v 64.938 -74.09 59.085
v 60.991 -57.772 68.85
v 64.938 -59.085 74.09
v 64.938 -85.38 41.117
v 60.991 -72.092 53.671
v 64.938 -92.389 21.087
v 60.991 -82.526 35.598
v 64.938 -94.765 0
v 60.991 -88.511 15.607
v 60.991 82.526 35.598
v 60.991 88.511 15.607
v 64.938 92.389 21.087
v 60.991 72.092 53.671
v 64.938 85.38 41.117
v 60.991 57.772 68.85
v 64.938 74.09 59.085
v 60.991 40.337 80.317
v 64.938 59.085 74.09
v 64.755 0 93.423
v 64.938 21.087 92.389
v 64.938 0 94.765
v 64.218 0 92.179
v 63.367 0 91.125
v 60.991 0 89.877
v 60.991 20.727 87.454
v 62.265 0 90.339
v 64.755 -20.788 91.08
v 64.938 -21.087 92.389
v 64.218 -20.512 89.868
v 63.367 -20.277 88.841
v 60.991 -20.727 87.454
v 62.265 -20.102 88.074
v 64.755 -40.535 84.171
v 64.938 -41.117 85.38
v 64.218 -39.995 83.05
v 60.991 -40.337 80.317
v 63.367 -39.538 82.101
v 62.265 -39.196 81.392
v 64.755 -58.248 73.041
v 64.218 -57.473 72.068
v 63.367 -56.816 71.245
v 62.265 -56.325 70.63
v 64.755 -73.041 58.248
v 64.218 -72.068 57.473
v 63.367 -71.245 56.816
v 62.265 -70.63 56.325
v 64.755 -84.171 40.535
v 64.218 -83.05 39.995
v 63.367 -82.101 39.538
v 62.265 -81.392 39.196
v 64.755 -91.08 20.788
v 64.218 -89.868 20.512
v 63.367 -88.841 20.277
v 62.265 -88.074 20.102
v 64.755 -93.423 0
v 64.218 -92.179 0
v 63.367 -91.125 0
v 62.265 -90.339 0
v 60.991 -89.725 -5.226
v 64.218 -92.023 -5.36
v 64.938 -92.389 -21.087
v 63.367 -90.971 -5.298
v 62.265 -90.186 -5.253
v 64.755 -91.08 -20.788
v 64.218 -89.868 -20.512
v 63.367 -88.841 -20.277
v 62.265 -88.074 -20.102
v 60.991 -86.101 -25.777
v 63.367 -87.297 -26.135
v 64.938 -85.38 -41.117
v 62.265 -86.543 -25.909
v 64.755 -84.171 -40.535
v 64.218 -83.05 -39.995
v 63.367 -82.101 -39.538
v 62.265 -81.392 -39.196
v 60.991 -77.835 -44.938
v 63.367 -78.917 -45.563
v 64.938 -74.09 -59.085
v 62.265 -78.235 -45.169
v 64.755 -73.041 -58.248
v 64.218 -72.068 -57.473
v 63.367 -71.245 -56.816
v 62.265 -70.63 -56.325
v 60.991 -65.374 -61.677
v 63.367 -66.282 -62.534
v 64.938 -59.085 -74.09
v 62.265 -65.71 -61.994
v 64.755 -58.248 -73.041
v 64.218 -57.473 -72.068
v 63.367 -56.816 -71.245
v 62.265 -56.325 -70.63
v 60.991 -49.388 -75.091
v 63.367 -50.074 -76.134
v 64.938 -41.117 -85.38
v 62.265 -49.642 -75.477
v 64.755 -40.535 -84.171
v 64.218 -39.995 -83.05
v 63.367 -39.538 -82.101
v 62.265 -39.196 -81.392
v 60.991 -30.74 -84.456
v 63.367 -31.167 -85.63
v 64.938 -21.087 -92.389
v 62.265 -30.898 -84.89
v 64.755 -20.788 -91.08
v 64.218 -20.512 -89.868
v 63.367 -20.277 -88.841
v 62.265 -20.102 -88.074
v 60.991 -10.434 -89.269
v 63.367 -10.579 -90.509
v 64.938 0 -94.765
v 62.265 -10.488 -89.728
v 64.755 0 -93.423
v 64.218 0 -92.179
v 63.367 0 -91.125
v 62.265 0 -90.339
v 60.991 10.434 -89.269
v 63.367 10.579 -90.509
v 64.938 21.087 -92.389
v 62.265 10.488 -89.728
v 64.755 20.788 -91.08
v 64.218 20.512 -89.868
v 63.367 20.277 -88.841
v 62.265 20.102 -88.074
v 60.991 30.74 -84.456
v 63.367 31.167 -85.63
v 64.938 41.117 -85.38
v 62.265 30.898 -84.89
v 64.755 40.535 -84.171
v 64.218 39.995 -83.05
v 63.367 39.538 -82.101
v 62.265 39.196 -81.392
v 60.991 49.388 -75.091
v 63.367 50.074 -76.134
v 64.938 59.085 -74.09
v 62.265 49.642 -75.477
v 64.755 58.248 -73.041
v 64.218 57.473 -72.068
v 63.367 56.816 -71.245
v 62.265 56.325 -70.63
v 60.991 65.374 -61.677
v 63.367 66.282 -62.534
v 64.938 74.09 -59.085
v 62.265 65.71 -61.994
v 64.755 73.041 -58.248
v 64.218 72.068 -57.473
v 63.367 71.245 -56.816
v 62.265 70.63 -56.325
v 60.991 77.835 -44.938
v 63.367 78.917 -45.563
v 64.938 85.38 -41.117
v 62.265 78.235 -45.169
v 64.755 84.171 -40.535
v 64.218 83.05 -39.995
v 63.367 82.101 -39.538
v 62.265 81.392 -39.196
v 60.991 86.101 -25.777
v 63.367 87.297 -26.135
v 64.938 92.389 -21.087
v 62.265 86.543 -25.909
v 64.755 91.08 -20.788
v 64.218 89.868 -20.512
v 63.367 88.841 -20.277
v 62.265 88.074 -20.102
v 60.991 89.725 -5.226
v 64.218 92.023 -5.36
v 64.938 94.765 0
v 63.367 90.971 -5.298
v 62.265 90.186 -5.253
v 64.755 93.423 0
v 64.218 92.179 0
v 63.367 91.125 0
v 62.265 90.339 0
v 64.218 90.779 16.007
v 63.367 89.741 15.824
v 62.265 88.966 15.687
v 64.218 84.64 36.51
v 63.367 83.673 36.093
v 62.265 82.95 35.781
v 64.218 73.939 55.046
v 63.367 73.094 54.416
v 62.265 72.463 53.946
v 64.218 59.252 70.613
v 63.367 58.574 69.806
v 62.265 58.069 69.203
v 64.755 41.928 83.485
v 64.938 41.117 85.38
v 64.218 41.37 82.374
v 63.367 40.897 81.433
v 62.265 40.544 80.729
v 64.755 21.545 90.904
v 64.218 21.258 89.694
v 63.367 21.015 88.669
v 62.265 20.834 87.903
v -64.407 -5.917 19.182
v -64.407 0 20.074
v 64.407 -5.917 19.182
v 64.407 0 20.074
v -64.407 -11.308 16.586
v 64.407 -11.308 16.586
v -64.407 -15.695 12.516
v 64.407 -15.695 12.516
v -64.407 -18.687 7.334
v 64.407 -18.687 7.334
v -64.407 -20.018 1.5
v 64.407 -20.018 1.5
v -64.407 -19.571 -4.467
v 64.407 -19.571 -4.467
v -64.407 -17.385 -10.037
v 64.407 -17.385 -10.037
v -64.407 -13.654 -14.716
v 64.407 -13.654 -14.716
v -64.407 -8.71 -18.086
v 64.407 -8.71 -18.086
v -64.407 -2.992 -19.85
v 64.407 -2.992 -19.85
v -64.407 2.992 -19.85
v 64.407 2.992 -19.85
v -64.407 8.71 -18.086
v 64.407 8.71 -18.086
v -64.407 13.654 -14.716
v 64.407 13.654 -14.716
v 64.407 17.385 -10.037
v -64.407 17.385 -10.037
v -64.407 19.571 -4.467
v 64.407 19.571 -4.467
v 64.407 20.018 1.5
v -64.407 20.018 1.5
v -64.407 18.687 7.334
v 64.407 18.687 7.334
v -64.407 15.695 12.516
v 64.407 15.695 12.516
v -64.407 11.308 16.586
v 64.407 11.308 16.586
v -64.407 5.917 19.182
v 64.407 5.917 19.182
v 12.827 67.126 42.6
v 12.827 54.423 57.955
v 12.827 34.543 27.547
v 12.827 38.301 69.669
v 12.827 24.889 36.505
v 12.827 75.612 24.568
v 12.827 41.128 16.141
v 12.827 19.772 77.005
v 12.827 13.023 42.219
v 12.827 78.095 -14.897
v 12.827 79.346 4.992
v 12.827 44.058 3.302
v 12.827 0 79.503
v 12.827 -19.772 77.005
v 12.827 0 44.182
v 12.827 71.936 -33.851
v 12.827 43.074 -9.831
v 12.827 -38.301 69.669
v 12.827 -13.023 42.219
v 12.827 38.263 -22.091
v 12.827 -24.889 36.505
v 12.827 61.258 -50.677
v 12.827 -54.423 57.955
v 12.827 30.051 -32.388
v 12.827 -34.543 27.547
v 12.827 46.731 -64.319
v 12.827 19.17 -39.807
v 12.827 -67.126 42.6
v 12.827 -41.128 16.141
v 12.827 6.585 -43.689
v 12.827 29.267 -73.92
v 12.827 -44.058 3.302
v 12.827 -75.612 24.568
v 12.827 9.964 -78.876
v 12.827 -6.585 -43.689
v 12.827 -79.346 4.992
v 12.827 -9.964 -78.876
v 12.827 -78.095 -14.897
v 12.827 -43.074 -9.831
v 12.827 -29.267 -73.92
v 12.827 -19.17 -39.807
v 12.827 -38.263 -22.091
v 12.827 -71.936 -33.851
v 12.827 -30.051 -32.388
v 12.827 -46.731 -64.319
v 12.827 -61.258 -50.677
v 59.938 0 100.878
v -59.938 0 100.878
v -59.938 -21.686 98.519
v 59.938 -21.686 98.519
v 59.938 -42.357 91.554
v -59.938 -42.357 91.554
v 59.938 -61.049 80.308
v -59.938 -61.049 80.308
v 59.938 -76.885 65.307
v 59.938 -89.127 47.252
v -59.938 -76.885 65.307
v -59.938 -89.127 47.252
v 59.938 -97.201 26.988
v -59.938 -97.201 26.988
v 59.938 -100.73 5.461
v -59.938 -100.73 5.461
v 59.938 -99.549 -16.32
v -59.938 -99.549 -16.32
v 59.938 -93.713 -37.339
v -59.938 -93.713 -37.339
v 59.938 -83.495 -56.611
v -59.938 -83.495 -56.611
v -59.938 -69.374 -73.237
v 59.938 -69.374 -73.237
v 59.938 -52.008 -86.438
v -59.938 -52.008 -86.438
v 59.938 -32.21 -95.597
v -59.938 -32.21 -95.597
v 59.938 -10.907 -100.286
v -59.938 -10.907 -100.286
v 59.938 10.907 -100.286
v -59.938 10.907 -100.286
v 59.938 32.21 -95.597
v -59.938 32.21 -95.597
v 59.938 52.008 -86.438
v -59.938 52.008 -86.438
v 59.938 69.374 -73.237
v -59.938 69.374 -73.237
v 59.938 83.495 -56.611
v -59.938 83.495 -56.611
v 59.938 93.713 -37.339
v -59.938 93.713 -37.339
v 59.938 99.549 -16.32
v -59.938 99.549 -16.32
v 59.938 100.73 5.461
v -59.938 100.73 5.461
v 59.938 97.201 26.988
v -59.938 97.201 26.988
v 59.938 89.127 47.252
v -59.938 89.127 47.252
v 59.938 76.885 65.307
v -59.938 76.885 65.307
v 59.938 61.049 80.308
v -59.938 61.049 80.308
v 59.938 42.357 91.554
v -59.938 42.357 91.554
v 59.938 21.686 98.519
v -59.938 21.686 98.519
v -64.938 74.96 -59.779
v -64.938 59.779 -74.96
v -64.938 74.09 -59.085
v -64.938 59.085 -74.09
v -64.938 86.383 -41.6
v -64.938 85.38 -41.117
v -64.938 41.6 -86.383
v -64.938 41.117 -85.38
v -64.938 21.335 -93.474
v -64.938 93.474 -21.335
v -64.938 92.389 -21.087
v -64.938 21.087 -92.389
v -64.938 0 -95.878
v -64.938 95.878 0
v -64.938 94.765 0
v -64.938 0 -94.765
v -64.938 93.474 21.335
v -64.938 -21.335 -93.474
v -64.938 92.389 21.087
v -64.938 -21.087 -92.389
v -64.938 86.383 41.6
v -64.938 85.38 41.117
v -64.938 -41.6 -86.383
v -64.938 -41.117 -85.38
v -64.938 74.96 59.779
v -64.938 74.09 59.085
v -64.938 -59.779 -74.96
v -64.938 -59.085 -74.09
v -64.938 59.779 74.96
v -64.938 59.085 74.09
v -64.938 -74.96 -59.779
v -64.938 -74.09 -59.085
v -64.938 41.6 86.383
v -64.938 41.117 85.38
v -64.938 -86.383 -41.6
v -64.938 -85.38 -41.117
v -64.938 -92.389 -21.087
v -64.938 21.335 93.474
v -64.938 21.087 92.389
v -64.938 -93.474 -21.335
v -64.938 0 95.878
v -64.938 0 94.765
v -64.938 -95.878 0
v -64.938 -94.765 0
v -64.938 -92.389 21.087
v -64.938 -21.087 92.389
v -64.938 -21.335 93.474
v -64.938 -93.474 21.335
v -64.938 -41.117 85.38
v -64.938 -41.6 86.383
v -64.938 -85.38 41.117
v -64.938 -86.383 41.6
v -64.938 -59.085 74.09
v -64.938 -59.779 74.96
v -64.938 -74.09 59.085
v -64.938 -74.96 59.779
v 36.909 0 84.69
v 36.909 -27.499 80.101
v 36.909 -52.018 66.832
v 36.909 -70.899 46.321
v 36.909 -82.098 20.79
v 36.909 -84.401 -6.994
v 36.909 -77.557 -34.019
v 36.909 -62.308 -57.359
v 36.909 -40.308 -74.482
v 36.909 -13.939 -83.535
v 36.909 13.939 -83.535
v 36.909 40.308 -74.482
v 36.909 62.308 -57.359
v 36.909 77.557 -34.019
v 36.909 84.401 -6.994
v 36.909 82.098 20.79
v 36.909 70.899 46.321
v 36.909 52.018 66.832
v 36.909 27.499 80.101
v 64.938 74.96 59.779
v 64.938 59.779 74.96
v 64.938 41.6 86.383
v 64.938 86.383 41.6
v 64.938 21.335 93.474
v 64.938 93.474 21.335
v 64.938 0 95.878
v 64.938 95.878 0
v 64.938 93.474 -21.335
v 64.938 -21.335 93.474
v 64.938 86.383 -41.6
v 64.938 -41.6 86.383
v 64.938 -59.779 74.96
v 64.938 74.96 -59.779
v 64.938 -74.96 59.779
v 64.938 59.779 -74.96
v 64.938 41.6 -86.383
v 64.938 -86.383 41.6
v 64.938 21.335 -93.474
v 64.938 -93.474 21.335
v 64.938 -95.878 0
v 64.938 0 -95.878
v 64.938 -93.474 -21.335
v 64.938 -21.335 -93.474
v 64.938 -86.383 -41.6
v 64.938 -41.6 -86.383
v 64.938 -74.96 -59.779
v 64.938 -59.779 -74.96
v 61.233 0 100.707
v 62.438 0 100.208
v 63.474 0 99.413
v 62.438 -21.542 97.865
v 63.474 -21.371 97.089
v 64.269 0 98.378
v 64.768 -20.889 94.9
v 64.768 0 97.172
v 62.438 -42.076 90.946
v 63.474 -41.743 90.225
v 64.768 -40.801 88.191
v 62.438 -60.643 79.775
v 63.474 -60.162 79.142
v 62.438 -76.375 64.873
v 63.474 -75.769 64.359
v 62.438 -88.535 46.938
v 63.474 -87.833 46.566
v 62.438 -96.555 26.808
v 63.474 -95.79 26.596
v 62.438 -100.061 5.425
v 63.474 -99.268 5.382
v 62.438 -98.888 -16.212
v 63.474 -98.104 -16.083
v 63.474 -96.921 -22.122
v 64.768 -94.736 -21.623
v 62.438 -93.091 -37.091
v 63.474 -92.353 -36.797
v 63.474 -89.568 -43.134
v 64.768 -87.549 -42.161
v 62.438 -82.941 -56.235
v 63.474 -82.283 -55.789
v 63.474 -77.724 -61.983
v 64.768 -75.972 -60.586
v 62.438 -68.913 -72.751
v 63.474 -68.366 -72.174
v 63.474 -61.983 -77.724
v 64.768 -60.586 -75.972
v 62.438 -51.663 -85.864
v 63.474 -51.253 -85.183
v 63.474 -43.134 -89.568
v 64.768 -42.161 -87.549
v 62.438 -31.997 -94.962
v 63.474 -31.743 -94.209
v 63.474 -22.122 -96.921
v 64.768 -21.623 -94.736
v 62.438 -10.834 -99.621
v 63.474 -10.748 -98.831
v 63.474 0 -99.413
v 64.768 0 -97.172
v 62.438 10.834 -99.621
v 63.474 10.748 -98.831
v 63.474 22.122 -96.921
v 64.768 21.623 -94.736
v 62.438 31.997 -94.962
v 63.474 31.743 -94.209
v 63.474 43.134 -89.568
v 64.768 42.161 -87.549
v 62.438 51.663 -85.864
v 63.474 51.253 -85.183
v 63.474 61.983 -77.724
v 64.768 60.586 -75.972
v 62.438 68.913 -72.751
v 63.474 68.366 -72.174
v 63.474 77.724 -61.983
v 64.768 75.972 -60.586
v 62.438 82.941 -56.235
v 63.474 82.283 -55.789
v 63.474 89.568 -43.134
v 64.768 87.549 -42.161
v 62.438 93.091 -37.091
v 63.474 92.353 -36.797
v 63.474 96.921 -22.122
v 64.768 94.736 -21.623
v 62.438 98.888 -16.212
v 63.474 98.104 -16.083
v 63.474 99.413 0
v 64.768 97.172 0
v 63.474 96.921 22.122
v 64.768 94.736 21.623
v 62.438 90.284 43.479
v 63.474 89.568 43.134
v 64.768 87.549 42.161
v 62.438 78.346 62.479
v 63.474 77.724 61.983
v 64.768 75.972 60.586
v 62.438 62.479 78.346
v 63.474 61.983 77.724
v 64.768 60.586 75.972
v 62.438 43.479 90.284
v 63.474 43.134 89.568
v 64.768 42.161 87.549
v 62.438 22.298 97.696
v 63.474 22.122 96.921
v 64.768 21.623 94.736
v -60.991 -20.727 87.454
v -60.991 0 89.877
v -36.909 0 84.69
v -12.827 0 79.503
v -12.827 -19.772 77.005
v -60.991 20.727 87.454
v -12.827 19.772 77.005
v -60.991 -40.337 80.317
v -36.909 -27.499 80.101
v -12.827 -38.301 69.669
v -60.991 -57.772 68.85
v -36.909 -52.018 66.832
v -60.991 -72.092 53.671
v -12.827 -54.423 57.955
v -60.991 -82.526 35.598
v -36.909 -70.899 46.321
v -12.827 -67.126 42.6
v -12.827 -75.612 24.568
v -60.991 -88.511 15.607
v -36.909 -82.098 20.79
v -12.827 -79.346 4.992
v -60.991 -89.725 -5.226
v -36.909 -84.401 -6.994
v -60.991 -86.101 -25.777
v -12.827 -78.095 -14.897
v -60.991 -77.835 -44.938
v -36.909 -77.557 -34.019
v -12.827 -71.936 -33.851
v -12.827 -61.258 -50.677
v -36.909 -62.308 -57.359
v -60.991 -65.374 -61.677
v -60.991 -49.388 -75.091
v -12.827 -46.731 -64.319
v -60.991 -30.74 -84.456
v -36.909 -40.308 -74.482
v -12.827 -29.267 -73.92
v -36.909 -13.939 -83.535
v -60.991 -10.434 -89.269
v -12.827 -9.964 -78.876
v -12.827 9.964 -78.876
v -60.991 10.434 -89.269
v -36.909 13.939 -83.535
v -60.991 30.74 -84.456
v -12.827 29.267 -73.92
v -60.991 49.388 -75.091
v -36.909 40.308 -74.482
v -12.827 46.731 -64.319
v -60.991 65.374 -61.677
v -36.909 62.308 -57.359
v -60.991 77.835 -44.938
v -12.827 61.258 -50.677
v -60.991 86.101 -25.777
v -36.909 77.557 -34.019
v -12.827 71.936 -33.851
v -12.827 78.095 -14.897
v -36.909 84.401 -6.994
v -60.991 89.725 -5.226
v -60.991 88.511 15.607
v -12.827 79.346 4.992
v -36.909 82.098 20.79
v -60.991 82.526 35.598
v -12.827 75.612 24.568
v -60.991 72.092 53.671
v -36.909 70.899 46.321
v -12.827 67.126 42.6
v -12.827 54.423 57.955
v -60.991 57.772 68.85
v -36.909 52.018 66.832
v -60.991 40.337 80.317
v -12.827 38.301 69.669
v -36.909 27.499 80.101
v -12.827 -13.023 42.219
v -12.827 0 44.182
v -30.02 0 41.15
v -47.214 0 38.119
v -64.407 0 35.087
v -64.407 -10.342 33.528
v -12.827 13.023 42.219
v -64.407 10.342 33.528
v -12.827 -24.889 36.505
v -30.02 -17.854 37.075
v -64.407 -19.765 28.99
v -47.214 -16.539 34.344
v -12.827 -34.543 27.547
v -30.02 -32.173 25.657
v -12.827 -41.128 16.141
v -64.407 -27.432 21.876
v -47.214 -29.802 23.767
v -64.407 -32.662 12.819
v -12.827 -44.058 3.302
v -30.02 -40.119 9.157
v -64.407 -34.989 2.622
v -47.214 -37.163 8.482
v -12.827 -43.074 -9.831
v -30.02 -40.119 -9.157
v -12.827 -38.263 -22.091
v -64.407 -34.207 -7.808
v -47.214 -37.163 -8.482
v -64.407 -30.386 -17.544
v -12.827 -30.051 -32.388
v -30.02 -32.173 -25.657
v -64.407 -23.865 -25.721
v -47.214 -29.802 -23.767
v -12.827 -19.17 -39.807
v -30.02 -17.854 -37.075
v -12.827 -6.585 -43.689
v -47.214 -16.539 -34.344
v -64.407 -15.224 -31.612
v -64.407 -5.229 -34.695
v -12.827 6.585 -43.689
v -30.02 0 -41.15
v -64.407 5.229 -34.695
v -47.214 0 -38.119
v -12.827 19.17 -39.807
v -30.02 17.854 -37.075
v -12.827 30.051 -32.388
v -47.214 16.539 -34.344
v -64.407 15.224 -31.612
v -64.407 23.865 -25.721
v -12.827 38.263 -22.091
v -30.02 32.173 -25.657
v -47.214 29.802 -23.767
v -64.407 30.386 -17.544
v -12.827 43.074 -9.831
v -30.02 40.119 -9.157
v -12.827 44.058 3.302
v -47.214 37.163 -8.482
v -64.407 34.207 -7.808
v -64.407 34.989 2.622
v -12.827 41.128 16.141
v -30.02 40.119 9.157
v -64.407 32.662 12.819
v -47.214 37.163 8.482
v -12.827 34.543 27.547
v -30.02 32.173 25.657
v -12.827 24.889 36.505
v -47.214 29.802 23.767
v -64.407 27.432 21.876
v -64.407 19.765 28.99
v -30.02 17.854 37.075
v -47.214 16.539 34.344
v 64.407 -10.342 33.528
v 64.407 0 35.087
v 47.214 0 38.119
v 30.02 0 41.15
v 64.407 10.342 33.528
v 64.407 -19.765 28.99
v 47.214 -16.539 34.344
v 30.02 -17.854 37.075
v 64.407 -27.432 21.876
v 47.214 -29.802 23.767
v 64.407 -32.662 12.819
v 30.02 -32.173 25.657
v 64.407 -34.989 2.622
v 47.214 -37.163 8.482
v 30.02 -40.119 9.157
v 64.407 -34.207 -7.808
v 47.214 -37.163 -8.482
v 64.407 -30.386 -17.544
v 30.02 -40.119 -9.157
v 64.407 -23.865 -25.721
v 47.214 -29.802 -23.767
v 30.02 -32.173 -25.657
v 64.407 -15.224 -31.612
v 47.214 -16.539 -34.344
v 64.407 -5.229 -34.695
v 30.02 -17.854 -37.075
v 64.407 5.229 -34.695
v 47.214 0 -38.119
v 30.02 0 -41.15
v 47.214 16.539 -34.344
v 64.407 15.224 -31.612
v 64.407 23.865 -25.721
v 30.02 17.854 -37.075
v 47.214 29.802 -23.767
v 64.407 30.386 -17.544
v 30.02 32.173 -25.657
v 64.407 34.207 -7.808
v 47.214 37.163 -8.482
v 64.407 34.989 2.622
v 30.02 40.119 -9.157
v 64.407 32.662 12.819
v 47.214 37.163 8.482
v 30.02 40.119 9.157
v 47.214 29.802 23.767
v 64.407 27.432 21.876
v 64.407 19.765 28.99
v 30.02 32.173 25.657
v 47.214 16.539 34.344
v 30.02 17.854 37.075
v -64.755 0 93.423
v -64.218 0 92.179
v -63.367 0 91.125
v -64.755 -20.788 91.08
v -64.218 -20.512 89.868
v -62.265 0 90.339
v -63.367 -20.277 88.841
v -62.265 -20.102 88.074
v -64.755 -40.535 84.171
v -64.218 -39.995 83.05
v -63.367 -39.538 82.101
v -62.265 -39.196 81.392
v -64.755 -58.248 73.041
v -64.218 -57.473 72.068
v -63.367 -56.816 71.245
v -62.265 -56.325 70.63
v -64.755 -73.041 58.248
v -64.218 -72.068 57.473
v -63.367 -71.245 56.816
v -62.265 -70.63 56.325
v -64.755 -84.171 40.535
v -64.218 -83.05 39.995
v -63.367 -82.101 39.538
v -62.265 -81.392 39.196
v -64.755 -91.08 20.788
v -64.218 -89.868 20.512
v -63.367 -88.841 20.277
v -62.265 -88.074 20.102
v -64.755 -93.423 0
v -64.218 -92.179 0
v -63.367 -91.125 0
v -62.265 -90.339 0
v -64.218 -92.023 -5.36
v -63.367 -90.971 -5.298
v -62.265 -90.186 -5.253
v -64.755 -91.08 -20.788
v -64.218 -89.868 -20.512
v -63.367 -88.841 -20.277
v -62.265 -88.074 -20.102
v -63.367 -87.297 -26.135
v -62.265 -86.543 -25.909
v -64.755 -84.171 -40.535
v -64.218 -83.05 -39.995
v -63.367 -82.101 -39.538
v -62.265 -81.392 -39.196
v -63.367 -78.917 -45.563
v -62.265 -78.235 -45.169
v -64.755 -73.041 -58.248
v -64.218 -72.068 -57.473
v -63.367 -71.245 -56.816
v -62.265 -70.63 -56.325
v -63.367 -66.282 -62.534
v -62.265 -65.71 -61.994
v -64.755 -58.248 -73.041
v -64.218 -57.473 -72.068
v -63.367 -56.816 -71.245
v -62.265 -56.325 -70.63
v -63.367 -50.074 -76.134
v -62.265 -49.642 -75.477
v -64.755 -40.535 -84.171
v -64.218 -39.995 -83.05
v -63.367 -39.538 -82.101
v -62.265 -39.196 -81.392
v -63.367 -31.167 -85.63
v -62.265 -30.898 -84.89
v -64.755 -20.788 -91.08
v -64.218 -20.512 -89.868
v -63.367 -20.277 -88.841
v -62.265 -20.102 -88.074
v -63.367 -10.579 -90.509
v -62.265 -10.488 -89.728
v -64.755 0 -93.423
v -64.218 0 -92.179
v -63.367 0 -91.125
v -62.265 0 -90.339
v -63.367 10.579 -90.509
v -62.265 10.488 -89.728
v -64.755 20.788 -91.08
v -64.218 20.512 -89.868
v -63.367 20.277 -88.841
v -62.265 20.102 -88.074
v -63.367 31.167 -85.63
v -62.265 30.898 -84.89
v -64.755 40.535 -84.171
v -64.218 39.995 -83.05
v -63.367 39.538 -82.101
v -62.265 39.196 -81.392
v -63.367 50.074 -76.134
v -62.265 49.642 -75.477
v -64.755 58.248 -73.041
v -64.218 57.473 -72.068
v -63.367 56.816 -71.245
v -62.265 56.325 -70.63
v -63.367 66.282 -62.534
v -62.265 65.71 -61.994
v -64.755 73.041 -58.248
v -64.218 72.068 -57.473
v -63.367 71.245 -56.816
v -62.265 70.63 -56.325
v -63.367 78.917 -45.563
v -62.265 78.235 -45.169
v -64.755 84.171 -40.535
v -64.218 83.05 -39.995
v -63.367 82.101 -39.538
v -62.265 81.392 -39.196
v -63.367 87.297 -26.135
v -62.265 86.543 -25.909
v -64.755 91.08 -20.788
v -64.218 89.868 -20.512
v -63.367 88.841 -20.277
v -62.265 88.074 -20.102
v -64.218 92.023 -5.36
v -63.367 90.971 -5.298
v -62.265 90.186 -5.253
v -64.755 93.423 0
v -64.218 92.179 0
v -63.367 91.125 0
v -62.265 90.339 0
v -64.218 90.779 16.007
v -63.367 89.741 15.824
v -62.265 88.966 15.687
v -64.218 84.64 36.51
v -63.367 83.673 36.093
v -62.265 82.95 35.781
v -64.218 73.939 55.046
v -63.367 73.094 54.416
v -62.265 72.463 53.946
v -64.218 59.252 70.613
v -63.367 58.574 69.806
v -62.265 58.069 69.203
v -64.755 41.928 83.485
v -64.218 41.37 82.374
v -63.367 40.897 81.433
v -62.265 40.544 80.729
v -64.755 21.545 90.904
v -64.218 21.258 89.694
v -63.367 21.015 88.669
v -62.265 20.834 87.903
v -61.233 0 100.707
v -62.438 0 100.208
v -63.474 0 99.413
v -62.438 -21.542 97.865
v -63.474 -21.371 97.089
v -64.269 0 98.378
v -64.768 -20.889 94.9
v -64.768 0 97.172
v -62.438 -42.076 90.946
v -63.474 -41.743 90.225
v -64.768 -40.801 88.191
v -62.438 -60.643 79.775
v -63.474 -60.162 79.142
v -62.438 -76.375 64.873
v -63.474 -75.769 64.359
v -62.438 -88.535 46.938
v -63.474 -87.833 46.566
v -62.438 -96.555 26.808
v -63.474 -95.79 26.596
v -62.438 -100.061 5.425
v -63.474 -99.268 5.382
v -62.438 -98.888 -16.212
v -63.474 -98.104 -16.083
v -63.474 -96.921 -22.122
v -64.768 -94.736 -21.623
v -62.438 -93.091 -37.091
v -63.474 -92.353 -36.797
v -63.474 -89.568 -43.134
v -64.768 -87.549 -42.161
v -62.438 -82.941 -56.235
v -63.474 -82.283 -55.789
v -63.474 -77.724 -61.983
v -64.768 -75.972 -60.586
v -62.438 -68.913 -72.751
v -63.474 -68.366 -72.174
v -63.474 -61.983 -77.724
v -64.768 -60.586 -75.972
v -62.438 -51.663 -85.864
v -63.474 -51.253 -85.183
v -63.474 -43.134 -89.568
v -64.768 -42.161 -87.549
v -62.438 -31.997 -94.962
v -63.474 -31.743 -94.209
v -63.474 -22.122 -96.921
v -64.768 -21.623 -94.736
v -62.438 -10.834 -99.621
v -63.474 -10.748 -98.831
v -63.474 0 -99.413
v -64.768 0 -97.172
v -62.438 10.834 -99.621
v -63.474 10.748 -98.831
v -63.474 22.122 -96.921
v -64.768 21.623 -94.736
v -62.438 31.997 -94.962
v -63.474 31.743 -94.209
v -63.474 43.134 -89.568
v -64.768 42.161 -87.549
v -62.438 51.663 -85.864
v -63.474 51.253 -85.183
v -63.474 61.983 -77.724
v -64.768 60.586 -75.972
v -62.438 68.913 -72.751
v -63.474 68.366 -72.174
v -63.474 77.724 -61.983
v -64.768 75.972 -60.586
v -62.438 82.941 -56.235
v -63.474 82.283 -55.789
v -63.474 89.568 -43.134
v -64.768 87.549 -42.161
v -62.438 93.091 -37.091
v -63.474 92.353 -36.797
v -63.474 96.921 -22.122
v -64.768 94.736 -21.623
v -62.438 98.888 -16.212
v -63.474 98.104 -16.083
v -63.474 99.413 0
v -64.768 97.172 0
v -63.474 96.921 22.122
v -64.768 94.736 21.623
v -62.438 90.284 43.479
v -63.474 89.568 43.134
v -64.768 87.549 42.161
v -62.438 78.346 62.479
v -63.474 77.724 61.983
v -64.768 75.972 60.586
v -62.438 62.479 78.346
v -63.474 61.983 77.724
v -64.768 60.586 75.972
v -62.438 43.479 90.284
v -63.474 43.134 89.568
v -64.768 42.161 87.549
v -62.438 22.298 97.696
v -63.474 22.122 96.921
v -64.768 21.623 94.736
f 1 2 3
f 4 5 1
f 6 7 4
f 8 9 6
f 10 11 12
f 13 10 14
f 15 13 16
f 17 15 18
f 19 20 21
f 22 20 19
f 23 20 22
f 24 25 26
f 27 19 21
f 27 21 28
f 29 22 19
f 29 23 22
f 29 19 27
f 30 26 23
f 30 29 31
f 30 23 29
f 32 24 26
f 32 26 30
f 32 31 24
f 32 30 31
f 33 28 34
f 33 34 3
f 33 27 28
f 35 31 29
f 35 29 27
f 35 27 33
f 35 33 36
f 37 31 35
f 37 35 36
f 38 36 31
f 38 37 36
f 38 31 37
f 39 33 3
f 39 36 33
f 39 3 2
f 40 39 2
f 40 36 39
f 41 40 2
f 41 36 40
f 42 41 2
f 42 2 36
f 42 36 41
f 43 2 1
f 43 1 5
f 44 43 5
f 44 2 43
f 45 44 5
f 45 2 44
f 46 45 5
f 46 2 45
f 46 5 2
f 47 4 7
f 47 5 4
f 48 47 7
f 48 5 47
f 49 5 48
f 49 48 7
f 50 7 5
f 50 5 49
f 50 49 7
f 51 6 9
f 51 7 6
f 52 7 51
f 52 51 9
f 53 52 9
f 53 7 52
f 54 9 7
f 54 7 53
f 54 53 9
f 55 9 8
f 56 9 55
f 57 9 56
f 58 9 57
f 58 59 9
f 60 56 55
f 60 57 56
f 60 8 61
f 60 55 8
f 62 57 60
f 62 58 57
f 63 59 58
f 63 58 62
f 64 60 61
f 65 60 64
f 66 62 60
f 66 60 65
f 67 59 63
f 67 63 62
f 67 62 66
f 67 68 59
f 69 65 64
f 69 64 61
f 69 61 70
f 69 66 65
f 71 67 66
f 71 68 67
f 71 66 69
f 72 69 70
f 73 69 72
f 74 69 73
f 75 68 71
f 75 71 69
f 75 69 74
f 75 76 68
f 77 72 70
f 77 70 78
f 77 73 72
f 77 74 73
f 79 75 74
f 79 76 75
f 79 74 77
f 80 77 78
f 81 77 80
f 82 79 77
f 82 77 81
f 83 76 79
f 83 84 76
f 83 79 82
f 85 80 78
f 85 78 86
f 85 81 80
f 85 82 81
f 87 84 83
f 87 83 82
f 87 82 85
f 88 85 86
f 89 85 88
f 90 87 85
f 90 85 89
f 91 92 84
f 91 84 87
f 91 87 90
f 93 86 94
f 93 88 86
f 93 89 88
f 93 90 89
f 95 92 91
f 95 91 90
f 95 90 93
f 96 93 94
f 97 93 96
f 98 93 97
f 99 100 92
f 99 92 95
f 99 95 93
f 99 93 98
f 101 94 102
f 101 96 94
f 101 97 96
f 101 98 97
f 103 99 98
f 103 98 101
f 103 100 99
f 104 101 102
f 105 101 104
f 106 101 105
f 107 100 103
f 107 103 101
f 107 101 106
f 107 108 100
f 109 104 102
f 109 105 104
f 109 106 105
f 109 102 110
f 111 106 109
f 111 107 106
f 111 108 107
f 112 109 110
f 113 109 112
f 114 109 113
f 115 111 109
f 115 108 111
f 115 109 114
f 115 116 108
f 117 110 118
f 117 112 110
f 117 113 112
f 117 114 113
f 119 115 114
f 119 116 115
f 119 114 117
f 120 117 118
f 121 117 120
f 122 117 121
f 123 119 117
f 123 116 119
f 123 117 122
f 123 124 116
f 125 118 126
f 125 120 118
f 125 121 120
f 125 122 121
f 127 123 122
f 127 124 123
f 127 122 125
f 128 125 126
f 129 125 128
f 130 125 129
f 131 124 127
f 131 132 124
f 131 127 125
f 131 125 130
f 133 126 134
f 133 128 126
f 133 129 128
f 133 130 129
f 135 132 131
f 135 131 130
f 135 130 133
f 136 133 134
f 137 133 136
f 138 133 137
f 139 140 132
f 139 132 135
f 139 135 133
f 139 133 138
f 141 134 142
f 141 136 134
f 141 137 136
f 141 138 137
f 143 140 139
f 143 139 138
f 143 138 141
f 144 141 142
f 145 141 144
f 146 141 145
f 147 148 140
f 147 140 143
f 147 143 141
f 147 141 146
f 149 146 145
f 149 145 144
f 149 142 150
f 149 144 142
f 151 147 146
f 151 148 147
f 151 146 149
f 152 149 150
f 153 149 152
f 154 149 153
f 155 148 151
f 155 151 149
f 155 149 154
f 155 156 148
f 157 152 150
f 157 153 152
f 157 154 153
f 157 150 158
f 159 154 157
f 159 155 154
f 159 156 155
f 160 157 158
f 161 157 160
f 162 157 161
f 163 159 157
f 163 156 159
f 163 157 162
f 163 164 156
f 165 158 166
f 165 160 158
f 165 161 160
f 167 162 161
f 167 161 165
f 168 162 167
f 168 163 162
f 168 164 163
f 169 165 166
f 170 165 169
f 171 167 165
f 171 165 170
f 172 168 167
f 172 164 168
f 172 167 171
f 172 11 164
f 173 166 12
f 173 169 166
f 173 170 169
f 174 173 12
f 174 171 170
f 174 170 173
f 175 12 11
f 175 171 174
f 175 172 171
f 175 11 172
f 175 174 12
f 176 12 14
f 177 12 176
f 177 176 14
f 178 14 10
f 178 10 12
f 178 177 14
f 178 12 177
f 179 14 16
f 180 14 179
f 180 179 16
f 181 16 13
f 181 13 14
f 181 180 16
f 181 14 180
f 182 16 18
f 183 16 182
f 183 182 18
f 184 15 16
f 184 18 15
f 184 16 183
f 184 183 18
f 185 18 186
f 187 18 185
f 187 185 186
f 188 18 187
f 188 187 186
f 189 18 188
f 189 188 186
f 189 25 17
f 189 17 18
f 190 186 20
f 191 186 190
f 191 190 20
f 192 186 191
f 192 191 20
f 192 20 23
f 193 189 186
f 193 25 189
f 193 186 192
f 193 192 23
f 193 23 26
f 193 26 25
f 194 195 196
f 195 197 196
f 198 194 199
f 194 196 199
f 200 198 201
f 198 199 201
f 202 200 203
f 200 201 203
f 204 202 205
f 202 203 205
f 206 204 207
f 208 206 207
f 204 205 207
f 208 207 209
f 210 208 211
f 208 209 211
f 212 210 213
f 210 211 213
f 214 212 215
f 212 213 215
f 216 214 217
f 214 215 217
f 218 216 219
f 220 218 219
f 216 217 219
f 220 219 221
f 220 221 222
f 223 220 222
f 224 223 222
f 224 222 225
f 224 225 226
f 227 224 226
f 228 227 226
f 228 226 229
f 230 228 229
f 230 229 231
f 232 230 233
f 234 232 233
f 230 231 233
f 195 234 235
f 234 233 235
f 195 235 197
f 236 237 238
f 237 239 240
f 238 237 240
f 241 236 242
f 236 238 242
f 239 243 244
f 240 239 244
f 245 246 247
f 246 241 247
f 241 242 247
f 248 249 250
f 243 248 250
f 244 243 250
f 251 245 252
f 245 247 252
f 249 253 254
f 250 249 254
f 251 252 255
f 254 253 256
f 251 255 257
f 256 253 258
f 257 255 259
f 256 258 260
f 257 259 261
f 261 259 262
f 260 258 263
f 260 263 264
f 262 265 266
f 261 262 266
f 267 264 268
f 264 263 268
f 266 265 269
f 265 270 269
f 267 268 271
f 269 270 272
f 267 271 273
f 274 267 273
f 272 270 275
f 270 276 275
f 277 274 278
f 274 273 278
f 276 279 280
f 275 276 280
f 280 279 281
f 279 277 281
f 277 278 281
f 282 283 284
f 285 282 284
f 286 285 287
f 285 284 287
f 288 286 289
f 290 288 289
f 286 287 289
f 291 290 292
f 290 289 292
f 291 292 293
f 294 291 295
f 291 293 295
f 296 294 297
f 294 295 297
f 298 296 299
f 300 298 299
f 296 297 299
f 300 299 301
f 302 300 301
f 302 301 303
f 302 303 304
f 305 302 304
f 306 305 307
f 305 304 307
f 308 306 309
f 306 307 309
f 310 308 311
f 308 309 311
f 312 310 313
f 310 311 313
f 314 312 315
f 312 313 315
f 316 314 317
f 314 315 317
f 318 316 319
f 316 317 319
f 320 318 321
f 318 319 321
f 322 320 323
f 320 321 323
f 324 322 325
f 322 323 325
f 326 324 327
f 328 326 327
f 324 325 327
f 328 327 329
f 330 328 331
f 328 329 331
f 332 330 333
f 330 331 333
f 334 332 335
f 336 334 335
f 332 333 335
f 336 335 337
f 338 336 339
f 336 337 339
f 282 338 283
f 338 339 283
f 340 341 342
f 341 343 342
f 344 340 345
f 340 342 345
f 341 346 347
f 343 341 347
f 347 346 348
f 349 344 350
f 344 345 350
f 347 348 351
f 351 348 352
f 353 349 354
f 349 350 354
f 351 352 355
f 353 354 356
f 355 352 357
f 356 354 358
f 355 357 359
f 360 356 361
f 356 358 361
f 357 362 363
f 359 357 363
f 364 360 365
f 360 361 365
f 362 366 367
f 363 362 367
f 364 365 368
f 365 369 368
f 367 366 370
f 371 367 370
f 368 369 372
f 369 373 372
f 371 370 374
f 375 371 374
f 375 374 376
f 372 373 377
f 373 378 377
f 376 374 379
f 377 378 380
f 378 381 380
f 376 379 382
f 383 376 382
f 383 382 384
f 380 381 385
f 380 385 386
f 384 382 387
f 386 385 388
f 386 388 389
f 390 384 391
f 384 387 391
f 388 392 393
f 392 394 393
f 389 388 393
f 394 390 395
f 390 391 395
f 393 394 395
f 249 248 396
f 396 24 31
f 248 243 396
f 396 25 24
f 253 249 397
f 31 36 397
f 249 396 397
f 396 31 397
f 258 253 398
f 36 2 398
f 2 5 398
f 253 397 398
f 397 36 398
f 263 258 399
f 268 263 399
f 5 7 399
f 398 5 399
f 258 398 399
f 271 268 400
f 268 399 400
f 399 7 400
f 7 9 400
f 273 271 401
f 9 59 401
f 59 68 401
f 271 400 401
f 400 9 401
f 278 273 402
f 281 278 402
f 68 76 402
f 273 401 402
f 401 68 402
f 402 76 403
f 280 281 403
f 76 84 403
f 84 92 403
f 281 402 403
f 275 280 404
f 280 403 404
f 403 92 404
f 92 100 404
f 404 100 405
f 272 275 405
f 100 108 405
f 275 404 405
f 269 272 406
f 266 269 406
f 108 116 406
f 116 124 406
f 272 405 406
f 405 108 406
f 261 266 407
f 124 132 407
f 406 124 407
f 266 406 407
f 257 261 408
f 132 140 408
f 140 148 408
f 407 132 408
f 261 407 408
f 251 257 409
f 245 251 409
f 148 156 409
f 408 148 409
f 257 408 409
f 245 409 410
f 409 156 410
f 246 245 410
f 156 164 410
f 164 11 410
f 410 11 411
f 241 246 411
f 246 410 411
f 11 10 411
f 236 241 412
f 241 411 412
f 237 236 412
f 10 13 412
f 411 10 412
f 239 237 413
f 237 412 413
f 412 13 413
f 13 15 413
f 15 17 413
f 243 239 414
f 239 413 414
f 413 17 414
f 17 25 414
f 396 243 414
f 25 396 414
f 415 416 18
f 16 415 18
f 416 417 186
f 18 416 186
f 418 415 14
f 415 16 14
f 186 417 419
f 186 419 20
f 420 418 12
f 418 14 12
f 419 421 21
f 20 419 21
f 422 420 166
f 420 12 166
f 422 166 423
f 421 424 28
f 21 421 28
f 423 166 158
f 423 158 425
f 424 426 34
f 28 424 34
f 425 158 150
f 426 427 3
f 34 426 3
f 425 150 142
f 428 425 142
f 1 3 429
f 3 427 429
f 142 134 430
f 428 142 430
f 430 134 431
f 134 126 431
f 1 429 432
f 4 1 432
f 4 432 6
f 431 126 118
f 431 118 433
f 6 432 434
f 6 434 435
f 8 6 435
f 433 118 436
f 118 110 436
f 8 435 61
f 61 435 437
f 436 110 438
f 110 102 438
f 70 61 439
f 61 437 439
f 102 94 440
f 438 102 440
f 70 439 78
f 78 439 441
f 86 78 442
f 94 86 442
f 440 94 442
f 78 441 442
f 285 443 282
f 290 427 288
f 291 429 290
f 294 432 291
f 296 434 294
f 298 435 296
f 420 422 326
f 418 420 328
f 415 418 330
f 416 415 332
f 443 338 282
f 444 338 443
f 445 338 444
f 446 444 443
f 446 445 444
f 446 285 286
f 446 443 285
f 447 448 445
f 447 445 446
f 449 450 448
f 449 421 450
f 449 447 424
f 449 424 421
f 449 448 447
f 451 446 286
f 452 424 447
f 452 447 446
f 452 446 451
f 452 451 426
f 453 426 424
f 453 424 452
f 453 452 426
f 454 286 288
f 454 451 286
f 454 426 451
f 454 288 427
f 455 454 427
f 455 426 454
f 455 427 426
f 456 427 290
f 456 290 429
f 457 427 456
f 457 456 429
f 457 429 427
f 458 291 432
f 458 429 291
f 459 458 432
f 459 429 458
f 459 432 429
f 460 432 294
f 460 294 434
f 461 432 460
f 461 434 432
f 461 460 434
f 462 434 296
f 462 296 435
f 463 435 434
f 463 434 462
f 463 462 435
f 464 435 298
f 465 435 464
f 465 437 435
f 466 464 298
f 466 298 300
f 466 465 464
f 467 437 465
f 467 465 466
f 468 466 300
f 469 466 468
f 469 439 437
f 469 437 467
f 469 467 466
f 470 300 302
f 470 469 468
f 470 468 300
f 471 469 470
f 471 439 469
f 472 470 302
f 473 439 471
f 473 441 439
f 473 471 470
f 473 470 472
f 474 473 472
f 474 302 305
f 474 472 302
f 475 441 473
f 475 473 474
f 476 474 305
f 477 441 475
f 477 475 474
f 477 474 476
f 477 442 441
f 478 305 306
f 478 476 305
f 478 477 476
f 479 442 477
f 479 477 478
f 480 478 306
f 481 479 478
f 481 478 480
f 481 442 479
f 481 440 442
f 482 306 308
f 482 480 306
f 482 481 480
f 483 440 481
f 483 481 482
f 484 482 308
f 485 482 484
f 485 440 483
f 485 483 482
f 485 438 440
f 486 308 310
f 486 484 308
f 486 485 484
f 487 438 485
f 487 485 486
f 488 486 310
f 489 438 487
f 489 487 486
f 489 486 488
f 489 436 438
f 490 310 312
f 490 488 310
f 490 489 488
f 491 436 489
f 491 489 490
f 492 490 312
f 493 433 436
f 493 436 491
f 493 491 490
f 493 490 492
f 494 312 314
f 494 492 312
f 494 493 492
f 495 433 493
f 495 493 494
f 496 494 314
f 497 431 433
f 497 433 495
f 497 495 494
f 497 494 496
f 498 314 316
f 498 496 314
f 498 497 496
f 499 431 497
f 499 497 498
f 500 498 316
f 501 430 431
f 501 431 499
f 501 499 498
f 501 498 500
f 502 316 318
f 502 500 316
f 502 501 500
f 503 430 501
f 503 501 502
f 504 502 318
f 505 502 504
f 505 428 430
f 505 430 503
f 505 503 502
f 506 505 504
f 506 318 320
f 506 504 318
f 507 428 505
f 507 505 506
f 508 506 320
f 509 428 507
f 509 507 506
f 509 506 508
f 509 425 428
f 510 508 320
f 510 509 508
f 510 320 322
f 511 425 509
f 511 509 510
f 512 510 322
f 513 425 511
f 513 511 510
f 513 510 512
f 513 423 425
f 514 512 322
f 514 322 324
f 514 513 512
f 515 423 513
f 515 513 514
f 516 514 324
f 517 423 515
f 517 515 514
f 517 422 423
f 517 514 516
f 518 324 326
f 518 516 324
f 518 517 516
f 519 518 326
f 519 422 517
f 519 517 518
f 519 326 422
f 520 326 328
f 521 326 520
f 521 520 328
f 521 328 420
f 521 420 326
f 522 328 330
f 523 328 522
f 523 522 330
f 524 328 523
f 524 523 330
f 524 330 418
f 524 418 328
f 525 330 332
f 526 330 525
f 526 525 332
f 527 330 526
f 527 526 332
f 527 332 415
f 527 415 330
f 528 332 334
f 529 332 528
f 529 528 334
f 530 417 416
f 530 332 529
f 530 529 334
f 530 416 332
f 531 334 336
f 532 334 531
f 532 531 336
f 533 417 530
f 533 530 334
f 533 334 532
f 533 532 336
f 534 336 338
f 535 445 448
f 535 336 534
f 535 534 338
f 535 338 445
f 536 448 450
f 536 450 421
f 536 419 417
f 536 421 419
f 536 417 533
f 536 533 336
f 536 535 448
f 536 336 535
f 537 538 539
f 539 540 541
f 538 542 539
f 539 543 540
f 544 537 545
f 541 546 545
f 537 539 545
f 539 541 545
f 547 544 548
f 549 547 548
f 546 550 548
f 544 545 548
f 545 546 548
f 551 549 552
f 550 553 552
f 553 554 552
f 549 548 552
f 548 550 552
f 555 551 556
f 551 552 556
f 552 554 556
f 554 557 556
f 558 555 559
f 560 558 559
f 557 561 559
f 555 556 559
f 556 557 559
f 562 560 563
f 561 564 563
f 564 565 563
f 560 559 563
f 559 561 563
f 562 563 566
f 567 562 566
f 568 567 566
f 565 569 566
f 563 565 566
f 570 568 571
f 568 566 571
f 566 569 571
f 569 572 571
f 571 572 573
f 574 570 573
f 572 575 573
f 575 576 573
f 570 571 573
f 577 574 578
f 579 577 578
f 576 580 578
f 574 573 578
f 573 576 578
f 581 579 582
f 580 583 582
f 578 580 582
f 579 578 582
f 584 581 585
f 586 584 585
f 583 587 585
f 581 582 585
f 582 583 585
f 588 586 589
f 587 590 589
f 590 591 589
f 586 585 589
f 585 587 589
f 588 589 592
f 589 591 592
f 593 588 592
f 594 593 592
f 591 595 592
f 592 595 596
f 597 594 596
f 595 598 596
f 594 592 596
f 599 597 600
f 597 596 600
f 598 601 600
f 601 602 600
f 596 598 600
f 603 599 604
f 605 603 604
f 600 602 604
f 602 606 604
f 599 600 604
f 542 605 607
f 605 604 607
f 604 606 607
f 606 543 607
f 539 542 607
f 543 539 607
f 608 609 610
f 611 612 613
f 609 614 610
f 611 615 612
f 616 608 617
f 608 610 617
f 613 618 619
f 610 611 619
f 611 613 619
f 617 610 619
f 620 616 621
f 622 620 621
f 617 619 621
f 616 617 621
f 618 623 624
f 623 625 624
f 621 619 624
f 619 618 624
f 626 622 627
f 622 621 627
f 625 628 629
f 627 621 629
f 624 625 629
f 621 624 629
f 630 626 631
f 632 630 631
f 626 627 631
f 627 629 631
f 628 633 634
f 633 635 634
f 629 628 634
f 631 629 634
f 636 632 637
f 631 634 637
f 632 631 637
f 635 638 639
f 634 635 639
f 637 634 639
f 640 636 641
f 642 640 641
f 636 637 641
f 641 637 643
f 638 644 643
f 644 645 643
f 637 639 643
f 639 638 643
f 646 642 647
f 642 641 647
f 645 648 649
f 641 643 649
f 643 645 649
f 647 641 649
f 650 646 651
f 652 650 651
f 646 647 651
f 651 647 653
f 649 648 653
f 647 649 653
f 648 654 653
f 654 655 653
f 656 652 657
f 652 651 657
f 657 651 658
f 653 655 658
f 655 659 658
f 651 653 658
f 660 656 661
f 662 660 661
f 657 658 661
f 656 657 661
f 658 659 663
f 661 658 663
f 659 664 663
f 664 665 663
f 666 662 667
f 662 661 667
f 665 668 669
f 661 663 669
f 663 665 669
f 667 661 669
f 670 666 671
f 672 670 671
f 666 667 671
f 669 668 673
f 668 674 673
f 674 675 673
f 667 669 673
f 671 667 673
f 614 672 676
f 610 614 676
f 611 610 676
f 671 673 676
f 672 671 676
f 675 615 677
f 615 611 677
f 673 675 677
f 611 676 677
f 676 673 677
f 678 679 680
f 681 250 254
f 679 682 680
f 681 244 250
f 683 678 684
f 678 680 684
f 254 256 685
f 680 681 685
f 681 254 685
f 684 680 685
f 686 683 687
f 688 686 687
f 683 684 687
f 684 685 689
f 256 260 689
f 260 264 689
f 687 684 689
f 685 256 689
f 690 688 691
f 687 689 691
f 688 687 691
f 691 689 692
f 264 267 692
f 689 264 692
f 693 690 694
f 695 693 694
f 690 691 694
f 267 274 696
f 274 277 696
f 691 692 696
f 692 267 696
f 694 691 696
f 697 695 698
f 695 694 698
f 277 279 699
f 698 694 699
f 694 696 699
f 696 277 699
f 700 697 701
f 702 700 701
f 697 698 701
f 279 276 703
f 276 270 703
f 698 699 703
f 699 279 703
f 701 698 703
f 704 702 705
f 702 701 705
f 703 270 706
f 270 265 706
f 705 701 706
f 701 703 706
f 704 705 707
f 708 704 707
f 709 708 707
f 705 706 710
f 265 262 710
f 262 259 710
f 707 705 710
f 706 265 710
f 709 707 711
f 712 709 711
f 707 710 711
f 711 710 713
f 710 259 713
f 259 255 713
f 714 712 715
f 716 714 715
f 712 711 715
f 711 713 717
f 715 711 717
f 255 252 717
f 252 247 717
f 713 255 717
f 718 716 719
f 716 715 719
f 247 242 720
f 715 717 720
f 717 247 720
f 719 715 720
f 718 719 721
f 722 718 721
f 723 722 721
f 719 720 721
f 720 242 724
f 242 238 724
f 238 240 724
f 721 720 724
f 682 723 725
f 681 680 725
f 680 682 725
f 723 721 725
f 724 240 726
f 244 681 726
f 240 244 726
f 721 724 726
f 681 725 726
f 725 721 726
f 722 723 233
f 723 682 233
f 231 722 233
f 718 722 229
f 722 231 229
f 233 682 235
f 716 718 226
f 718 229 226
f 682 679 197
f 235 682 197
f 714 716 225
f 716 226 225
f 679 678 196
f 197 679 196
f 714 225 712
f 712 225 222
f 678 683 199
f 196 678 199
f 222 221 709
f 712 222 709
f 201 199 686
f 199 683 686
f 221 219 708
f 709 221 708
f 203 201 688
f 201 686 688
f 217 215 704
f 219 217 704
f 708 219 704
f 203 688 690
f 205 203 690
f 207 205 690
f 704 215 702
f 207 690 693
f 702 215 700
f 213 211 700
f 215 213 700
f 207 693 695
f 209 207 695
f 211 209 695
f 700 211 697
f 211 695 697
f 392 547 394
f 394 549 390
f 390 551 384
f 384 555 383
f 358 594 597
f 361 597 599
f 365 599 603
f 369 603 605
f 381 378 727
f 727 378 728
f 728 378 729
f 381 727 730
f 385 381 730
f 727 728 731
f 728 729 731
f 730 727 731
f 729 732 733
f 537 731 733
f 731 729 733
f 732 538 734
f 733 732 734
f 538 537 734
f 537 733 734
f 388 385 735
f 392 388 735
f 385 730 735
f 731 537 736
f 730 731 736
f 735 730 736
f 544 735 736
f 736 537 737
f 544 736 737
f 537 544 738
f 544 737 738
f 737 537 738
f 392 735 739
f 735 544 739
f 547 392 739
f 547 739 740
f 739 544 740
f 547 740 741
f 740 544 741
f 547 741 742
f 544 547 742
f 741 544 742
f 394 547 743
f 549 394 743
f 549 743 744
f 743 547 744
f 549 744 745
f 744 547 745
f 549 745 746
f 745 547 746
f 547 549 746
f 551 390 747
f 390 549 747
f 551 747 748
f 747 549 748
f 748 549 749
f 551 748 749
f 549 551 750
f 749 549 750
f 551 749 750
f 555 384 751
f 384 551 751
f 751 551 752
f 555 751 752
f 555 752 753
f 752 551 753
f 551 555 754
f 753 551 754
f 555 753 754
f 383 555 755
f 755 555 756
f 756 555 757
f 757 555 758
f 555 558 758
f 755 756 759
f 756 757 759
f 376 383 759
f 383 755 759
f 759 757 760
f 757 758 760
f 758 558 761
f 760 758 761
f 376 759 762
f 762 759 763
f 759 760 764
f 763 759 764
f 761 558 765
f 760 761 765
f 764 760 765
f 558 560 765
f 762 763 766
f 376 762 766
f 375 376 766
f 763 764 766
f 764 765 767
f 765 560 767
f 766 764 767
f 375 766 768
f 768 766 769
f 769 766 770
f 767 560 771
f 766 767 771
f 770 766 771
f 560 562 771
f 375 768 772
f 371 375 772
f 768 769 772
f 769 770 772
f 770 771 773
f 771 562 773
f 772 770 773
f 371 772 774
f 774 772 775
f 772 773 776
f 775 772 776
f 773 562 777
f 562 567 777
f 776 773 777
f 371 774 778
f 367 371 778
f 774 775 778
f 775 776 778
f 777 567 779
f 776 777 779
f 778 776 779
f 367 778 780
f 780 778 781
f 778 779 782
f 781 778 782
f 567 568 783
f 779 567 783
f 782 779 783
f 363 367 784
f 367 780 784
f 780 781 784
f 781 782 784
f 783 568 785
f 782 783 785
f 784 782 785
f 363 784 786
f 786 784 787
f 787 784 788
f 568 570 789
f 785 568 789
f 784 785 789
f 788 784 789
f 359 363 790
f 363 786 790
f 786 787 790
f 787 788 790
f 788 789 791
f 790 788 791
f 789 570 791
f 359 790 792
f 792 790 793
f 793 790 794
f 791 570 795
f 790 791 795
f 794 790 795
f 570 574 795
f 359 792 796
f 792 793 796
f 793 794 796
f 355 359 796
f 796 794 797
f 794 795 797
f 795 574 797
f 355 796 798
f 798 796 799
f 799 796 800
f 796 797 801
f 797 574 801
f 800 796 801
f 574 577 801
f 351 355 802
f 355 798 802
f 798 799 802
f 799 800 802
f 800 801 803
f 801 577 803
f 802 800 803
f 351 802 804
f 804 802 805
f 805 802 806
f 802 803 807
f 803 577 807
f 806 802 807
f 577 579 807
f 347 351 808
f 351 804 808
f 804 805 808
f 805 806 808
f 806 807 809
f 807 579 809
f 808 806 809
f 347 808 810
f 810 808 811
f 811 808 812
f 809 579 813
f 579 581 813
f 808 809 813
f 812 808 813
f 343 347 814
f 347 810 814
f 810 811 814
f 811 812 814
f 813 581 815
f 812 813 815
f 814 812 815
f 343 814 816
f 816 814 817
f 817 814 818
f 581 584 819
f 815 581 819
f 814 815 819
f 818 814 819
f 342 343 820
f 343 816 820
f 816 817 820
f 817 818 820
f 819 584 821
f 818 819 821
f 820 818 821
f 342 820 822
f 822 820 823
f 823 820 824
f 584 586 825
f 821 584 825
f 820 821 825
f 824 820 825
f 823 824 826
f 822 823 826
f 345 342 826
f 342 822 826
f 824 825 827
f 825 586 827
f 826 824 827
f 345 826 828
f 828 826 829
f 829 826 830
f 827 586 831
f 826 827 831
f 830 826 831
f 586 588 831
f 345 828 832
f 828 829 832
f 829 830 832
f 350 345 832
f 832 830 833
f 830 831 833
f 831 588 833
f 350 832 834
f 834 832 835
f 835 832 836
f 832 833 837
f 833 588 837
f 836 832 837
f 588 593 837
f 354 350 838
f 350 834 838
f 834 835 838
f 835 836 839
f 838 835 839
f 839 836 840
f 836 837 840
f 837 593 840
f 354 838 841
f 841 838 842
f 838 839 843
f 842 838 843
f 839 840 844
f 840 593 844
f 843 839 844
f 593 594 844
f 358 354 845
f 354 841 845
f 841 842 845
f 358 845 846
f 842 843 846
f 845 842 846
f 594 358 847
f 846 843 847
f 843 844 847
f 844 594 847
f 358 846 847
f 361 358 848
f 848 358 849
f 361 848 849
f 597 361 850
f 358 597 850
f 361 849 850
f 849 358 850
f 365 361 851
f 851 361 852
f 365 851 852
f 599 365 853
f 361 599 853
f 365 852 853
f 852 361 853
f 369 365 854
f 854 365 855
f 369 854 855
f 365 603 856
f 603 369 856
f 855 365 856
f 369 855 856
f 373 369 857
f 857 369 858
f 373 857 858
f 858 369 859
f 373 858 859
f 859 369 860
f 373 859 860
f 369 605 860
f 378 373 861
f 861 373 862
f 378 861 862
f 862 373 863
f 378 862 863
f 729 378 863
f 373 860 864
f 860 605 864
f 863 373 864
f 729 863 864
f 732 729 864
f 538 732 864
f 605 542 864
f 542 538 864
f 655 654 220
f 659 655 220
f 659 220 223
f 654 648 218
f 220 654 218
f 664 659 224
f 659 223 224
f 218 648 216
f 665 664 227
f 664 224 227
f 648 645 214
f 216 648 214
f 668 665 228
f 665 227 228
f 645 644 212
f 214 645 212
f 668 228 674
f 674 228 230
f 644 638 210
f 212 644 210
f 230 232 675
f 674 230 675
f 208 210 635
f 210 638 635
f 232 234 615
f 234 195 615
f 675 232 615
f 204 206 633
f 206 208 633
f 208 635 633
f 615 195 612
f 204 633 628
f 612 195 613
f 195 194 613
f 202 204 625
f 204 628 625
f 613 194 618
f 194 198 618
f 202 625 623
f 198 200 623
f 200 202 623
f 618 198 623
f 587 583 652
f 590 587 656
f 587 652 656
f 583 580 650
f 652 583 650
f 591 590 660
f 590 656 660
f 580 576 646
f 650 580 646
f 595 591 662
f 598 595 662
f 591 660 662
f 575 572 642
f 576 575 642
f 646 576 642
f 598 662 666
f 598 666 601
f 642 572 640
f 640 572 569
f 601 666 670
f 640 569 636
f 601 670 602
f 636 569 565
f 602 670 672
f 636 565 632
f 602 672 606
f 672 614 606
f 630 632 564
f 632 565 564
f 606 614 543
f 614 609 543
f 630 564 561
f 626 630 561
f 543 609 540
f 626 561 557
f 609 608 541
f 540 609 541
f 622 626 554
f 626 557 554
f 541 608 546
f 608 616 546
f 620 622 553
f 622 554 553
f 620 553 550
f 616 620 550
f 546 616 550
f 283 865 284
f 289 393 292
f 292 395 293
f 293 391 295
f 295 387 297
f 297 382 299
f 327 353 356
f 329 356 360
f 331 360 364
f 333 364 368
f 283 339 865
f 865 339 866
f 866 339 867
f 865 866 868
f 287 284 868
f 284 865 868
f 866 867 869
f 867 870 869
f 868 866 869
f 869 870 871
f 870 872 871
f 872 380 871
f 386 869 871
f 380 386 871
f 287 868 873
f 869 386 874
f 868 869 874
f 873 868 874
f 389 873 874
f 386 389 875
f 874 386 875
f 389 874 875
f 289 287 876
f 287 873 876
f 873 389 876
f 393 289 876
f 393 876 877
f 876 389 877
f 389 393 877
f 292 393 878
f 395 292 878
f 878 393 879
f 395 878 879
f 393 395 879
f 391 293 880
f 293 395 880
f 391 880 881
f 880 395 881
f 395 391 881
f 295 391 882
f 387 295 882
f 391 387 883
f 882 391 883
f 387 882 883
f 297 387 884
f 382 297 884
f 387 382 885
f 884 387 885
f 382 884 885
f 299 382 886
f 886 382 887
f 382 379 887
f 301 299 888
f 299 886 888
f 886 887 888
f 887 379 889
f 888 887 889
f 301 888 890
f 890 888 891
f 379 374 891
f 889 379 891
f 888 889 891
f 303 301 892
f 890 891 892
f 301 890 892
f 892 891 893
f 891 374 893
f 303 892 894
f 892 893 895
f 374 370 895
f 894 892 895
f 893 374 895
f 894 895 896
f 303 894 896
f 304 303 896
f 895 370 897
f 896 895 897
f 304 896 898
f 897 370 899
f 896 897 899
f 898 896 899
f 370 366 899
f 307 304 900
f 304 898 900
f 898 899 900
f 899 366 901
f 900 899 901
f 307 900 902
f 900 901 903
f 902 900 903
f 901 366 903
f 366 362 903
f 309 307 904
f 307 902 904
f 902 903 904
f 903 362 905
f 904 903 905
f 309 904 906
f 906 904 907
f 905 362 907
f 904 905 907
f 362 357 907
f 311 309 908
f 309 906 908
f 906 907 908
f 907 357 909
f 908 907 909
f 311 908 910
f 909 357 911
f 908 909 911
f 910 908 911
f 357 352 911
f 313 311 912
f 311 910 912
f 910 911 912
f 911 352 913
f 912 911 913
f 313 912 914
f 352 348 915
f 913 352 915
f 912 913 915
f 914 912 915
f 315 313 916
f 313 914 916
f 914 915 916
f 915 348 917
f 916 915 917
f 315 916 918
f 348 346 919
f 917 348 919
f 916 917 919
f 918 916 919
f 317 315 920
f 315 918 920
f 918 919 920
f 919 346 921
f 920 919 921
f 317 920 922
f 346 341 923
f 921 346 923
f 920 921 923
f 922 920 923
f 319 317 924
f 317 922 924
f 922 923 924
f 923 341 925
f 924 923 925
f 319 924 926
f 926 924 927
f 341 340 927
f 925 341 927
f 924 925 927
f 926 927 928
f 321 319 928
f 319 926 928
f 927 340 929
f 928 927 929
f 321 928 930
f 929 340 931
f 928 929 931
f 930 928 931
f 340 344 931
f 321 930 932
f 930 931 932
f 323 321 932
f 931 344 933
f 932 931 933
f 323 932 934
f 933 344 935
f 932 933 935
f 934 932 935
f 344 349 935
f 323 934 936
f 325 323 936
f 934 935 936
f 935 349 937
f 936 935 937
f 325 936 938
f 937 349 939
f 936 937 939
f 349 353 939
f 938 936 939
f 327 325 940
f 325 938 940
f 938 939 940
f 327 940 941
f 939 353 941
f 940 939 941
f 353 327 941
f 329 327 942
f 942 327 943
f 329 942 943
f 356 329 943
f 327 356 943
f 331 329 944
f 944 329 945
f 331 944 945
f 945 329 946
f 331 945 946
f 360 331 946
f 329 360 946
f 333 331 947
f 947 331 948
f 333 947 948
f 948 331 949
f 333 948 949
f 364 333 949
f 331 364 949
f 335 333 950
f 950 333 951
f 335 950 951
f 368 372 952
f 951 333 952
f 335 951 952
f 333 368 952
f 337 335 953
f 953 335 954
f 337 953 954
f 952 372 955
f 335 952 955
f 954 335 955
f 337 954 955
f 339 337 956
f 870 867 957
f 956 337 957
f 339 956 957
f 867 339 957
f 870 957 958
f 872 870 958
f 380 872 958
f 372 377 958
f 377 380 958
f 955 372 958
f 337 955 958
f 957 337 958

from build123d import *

# Parameters (mm, degrees)
FILLET1_R = 5
FILLET2_R = 5
FILLET3_R = 5


with BuildPart() as part:
    # Sketch1 → Revolve1 (revolve)
    with BuildSketch(Plane.XY, mode=Mode.PRIVATE) as revolve1_sk:
        Polygon((64.406730934, 20.074337298), (64.406730934, 35.087163878), (12.827354924, 44.181999517), (12.827354924, 79.50287687), (64.938484301, 90.726812428), (64.938484301, 100.877802998), (-64.938484301, 100.877802998), (-64.938484301, 90.726812428), (-12.827354924, 79.50287687), (-12.827354924, 44.181999517), (-64.406730934, 35.087163878), (-64.406730934, 20.074337298), align=None)
    revolve(revolve1_sk.sketch.rotate(Axis((-142.971560085, 0, 0), (1, 0, 0)), 90), axis=Axis((-142.971560085, 0, 0), (1, 0, 0)))

    # Fillet1
    fillet1_edges = [part.edges().sort_by_distance(p)[0] for p in [
        (-64.938484301, 0, -100.877802998),
    ]]
    fillet(fillet1_edges, radius=FILLET1_R)

    # Fillet2
    fillet2_edges = [part.edges().sort_by_distance(p)[0] for p in [
        (64.938484301, 0, -90.726812428),
        (64.938484301, 0, -100.877802998),
    ]]
    fillet(fillet2_edges, radius=FILLET2_R)

    # Fillet3
    fillet3_edges = [part.edges().sort_by_distance(p)[0] for p in [
        (-64.938484301, 0, -90.726812428),
    ]]
    fillet(fillet3_edges, radius=FILLET3_R)


solid = part.part
